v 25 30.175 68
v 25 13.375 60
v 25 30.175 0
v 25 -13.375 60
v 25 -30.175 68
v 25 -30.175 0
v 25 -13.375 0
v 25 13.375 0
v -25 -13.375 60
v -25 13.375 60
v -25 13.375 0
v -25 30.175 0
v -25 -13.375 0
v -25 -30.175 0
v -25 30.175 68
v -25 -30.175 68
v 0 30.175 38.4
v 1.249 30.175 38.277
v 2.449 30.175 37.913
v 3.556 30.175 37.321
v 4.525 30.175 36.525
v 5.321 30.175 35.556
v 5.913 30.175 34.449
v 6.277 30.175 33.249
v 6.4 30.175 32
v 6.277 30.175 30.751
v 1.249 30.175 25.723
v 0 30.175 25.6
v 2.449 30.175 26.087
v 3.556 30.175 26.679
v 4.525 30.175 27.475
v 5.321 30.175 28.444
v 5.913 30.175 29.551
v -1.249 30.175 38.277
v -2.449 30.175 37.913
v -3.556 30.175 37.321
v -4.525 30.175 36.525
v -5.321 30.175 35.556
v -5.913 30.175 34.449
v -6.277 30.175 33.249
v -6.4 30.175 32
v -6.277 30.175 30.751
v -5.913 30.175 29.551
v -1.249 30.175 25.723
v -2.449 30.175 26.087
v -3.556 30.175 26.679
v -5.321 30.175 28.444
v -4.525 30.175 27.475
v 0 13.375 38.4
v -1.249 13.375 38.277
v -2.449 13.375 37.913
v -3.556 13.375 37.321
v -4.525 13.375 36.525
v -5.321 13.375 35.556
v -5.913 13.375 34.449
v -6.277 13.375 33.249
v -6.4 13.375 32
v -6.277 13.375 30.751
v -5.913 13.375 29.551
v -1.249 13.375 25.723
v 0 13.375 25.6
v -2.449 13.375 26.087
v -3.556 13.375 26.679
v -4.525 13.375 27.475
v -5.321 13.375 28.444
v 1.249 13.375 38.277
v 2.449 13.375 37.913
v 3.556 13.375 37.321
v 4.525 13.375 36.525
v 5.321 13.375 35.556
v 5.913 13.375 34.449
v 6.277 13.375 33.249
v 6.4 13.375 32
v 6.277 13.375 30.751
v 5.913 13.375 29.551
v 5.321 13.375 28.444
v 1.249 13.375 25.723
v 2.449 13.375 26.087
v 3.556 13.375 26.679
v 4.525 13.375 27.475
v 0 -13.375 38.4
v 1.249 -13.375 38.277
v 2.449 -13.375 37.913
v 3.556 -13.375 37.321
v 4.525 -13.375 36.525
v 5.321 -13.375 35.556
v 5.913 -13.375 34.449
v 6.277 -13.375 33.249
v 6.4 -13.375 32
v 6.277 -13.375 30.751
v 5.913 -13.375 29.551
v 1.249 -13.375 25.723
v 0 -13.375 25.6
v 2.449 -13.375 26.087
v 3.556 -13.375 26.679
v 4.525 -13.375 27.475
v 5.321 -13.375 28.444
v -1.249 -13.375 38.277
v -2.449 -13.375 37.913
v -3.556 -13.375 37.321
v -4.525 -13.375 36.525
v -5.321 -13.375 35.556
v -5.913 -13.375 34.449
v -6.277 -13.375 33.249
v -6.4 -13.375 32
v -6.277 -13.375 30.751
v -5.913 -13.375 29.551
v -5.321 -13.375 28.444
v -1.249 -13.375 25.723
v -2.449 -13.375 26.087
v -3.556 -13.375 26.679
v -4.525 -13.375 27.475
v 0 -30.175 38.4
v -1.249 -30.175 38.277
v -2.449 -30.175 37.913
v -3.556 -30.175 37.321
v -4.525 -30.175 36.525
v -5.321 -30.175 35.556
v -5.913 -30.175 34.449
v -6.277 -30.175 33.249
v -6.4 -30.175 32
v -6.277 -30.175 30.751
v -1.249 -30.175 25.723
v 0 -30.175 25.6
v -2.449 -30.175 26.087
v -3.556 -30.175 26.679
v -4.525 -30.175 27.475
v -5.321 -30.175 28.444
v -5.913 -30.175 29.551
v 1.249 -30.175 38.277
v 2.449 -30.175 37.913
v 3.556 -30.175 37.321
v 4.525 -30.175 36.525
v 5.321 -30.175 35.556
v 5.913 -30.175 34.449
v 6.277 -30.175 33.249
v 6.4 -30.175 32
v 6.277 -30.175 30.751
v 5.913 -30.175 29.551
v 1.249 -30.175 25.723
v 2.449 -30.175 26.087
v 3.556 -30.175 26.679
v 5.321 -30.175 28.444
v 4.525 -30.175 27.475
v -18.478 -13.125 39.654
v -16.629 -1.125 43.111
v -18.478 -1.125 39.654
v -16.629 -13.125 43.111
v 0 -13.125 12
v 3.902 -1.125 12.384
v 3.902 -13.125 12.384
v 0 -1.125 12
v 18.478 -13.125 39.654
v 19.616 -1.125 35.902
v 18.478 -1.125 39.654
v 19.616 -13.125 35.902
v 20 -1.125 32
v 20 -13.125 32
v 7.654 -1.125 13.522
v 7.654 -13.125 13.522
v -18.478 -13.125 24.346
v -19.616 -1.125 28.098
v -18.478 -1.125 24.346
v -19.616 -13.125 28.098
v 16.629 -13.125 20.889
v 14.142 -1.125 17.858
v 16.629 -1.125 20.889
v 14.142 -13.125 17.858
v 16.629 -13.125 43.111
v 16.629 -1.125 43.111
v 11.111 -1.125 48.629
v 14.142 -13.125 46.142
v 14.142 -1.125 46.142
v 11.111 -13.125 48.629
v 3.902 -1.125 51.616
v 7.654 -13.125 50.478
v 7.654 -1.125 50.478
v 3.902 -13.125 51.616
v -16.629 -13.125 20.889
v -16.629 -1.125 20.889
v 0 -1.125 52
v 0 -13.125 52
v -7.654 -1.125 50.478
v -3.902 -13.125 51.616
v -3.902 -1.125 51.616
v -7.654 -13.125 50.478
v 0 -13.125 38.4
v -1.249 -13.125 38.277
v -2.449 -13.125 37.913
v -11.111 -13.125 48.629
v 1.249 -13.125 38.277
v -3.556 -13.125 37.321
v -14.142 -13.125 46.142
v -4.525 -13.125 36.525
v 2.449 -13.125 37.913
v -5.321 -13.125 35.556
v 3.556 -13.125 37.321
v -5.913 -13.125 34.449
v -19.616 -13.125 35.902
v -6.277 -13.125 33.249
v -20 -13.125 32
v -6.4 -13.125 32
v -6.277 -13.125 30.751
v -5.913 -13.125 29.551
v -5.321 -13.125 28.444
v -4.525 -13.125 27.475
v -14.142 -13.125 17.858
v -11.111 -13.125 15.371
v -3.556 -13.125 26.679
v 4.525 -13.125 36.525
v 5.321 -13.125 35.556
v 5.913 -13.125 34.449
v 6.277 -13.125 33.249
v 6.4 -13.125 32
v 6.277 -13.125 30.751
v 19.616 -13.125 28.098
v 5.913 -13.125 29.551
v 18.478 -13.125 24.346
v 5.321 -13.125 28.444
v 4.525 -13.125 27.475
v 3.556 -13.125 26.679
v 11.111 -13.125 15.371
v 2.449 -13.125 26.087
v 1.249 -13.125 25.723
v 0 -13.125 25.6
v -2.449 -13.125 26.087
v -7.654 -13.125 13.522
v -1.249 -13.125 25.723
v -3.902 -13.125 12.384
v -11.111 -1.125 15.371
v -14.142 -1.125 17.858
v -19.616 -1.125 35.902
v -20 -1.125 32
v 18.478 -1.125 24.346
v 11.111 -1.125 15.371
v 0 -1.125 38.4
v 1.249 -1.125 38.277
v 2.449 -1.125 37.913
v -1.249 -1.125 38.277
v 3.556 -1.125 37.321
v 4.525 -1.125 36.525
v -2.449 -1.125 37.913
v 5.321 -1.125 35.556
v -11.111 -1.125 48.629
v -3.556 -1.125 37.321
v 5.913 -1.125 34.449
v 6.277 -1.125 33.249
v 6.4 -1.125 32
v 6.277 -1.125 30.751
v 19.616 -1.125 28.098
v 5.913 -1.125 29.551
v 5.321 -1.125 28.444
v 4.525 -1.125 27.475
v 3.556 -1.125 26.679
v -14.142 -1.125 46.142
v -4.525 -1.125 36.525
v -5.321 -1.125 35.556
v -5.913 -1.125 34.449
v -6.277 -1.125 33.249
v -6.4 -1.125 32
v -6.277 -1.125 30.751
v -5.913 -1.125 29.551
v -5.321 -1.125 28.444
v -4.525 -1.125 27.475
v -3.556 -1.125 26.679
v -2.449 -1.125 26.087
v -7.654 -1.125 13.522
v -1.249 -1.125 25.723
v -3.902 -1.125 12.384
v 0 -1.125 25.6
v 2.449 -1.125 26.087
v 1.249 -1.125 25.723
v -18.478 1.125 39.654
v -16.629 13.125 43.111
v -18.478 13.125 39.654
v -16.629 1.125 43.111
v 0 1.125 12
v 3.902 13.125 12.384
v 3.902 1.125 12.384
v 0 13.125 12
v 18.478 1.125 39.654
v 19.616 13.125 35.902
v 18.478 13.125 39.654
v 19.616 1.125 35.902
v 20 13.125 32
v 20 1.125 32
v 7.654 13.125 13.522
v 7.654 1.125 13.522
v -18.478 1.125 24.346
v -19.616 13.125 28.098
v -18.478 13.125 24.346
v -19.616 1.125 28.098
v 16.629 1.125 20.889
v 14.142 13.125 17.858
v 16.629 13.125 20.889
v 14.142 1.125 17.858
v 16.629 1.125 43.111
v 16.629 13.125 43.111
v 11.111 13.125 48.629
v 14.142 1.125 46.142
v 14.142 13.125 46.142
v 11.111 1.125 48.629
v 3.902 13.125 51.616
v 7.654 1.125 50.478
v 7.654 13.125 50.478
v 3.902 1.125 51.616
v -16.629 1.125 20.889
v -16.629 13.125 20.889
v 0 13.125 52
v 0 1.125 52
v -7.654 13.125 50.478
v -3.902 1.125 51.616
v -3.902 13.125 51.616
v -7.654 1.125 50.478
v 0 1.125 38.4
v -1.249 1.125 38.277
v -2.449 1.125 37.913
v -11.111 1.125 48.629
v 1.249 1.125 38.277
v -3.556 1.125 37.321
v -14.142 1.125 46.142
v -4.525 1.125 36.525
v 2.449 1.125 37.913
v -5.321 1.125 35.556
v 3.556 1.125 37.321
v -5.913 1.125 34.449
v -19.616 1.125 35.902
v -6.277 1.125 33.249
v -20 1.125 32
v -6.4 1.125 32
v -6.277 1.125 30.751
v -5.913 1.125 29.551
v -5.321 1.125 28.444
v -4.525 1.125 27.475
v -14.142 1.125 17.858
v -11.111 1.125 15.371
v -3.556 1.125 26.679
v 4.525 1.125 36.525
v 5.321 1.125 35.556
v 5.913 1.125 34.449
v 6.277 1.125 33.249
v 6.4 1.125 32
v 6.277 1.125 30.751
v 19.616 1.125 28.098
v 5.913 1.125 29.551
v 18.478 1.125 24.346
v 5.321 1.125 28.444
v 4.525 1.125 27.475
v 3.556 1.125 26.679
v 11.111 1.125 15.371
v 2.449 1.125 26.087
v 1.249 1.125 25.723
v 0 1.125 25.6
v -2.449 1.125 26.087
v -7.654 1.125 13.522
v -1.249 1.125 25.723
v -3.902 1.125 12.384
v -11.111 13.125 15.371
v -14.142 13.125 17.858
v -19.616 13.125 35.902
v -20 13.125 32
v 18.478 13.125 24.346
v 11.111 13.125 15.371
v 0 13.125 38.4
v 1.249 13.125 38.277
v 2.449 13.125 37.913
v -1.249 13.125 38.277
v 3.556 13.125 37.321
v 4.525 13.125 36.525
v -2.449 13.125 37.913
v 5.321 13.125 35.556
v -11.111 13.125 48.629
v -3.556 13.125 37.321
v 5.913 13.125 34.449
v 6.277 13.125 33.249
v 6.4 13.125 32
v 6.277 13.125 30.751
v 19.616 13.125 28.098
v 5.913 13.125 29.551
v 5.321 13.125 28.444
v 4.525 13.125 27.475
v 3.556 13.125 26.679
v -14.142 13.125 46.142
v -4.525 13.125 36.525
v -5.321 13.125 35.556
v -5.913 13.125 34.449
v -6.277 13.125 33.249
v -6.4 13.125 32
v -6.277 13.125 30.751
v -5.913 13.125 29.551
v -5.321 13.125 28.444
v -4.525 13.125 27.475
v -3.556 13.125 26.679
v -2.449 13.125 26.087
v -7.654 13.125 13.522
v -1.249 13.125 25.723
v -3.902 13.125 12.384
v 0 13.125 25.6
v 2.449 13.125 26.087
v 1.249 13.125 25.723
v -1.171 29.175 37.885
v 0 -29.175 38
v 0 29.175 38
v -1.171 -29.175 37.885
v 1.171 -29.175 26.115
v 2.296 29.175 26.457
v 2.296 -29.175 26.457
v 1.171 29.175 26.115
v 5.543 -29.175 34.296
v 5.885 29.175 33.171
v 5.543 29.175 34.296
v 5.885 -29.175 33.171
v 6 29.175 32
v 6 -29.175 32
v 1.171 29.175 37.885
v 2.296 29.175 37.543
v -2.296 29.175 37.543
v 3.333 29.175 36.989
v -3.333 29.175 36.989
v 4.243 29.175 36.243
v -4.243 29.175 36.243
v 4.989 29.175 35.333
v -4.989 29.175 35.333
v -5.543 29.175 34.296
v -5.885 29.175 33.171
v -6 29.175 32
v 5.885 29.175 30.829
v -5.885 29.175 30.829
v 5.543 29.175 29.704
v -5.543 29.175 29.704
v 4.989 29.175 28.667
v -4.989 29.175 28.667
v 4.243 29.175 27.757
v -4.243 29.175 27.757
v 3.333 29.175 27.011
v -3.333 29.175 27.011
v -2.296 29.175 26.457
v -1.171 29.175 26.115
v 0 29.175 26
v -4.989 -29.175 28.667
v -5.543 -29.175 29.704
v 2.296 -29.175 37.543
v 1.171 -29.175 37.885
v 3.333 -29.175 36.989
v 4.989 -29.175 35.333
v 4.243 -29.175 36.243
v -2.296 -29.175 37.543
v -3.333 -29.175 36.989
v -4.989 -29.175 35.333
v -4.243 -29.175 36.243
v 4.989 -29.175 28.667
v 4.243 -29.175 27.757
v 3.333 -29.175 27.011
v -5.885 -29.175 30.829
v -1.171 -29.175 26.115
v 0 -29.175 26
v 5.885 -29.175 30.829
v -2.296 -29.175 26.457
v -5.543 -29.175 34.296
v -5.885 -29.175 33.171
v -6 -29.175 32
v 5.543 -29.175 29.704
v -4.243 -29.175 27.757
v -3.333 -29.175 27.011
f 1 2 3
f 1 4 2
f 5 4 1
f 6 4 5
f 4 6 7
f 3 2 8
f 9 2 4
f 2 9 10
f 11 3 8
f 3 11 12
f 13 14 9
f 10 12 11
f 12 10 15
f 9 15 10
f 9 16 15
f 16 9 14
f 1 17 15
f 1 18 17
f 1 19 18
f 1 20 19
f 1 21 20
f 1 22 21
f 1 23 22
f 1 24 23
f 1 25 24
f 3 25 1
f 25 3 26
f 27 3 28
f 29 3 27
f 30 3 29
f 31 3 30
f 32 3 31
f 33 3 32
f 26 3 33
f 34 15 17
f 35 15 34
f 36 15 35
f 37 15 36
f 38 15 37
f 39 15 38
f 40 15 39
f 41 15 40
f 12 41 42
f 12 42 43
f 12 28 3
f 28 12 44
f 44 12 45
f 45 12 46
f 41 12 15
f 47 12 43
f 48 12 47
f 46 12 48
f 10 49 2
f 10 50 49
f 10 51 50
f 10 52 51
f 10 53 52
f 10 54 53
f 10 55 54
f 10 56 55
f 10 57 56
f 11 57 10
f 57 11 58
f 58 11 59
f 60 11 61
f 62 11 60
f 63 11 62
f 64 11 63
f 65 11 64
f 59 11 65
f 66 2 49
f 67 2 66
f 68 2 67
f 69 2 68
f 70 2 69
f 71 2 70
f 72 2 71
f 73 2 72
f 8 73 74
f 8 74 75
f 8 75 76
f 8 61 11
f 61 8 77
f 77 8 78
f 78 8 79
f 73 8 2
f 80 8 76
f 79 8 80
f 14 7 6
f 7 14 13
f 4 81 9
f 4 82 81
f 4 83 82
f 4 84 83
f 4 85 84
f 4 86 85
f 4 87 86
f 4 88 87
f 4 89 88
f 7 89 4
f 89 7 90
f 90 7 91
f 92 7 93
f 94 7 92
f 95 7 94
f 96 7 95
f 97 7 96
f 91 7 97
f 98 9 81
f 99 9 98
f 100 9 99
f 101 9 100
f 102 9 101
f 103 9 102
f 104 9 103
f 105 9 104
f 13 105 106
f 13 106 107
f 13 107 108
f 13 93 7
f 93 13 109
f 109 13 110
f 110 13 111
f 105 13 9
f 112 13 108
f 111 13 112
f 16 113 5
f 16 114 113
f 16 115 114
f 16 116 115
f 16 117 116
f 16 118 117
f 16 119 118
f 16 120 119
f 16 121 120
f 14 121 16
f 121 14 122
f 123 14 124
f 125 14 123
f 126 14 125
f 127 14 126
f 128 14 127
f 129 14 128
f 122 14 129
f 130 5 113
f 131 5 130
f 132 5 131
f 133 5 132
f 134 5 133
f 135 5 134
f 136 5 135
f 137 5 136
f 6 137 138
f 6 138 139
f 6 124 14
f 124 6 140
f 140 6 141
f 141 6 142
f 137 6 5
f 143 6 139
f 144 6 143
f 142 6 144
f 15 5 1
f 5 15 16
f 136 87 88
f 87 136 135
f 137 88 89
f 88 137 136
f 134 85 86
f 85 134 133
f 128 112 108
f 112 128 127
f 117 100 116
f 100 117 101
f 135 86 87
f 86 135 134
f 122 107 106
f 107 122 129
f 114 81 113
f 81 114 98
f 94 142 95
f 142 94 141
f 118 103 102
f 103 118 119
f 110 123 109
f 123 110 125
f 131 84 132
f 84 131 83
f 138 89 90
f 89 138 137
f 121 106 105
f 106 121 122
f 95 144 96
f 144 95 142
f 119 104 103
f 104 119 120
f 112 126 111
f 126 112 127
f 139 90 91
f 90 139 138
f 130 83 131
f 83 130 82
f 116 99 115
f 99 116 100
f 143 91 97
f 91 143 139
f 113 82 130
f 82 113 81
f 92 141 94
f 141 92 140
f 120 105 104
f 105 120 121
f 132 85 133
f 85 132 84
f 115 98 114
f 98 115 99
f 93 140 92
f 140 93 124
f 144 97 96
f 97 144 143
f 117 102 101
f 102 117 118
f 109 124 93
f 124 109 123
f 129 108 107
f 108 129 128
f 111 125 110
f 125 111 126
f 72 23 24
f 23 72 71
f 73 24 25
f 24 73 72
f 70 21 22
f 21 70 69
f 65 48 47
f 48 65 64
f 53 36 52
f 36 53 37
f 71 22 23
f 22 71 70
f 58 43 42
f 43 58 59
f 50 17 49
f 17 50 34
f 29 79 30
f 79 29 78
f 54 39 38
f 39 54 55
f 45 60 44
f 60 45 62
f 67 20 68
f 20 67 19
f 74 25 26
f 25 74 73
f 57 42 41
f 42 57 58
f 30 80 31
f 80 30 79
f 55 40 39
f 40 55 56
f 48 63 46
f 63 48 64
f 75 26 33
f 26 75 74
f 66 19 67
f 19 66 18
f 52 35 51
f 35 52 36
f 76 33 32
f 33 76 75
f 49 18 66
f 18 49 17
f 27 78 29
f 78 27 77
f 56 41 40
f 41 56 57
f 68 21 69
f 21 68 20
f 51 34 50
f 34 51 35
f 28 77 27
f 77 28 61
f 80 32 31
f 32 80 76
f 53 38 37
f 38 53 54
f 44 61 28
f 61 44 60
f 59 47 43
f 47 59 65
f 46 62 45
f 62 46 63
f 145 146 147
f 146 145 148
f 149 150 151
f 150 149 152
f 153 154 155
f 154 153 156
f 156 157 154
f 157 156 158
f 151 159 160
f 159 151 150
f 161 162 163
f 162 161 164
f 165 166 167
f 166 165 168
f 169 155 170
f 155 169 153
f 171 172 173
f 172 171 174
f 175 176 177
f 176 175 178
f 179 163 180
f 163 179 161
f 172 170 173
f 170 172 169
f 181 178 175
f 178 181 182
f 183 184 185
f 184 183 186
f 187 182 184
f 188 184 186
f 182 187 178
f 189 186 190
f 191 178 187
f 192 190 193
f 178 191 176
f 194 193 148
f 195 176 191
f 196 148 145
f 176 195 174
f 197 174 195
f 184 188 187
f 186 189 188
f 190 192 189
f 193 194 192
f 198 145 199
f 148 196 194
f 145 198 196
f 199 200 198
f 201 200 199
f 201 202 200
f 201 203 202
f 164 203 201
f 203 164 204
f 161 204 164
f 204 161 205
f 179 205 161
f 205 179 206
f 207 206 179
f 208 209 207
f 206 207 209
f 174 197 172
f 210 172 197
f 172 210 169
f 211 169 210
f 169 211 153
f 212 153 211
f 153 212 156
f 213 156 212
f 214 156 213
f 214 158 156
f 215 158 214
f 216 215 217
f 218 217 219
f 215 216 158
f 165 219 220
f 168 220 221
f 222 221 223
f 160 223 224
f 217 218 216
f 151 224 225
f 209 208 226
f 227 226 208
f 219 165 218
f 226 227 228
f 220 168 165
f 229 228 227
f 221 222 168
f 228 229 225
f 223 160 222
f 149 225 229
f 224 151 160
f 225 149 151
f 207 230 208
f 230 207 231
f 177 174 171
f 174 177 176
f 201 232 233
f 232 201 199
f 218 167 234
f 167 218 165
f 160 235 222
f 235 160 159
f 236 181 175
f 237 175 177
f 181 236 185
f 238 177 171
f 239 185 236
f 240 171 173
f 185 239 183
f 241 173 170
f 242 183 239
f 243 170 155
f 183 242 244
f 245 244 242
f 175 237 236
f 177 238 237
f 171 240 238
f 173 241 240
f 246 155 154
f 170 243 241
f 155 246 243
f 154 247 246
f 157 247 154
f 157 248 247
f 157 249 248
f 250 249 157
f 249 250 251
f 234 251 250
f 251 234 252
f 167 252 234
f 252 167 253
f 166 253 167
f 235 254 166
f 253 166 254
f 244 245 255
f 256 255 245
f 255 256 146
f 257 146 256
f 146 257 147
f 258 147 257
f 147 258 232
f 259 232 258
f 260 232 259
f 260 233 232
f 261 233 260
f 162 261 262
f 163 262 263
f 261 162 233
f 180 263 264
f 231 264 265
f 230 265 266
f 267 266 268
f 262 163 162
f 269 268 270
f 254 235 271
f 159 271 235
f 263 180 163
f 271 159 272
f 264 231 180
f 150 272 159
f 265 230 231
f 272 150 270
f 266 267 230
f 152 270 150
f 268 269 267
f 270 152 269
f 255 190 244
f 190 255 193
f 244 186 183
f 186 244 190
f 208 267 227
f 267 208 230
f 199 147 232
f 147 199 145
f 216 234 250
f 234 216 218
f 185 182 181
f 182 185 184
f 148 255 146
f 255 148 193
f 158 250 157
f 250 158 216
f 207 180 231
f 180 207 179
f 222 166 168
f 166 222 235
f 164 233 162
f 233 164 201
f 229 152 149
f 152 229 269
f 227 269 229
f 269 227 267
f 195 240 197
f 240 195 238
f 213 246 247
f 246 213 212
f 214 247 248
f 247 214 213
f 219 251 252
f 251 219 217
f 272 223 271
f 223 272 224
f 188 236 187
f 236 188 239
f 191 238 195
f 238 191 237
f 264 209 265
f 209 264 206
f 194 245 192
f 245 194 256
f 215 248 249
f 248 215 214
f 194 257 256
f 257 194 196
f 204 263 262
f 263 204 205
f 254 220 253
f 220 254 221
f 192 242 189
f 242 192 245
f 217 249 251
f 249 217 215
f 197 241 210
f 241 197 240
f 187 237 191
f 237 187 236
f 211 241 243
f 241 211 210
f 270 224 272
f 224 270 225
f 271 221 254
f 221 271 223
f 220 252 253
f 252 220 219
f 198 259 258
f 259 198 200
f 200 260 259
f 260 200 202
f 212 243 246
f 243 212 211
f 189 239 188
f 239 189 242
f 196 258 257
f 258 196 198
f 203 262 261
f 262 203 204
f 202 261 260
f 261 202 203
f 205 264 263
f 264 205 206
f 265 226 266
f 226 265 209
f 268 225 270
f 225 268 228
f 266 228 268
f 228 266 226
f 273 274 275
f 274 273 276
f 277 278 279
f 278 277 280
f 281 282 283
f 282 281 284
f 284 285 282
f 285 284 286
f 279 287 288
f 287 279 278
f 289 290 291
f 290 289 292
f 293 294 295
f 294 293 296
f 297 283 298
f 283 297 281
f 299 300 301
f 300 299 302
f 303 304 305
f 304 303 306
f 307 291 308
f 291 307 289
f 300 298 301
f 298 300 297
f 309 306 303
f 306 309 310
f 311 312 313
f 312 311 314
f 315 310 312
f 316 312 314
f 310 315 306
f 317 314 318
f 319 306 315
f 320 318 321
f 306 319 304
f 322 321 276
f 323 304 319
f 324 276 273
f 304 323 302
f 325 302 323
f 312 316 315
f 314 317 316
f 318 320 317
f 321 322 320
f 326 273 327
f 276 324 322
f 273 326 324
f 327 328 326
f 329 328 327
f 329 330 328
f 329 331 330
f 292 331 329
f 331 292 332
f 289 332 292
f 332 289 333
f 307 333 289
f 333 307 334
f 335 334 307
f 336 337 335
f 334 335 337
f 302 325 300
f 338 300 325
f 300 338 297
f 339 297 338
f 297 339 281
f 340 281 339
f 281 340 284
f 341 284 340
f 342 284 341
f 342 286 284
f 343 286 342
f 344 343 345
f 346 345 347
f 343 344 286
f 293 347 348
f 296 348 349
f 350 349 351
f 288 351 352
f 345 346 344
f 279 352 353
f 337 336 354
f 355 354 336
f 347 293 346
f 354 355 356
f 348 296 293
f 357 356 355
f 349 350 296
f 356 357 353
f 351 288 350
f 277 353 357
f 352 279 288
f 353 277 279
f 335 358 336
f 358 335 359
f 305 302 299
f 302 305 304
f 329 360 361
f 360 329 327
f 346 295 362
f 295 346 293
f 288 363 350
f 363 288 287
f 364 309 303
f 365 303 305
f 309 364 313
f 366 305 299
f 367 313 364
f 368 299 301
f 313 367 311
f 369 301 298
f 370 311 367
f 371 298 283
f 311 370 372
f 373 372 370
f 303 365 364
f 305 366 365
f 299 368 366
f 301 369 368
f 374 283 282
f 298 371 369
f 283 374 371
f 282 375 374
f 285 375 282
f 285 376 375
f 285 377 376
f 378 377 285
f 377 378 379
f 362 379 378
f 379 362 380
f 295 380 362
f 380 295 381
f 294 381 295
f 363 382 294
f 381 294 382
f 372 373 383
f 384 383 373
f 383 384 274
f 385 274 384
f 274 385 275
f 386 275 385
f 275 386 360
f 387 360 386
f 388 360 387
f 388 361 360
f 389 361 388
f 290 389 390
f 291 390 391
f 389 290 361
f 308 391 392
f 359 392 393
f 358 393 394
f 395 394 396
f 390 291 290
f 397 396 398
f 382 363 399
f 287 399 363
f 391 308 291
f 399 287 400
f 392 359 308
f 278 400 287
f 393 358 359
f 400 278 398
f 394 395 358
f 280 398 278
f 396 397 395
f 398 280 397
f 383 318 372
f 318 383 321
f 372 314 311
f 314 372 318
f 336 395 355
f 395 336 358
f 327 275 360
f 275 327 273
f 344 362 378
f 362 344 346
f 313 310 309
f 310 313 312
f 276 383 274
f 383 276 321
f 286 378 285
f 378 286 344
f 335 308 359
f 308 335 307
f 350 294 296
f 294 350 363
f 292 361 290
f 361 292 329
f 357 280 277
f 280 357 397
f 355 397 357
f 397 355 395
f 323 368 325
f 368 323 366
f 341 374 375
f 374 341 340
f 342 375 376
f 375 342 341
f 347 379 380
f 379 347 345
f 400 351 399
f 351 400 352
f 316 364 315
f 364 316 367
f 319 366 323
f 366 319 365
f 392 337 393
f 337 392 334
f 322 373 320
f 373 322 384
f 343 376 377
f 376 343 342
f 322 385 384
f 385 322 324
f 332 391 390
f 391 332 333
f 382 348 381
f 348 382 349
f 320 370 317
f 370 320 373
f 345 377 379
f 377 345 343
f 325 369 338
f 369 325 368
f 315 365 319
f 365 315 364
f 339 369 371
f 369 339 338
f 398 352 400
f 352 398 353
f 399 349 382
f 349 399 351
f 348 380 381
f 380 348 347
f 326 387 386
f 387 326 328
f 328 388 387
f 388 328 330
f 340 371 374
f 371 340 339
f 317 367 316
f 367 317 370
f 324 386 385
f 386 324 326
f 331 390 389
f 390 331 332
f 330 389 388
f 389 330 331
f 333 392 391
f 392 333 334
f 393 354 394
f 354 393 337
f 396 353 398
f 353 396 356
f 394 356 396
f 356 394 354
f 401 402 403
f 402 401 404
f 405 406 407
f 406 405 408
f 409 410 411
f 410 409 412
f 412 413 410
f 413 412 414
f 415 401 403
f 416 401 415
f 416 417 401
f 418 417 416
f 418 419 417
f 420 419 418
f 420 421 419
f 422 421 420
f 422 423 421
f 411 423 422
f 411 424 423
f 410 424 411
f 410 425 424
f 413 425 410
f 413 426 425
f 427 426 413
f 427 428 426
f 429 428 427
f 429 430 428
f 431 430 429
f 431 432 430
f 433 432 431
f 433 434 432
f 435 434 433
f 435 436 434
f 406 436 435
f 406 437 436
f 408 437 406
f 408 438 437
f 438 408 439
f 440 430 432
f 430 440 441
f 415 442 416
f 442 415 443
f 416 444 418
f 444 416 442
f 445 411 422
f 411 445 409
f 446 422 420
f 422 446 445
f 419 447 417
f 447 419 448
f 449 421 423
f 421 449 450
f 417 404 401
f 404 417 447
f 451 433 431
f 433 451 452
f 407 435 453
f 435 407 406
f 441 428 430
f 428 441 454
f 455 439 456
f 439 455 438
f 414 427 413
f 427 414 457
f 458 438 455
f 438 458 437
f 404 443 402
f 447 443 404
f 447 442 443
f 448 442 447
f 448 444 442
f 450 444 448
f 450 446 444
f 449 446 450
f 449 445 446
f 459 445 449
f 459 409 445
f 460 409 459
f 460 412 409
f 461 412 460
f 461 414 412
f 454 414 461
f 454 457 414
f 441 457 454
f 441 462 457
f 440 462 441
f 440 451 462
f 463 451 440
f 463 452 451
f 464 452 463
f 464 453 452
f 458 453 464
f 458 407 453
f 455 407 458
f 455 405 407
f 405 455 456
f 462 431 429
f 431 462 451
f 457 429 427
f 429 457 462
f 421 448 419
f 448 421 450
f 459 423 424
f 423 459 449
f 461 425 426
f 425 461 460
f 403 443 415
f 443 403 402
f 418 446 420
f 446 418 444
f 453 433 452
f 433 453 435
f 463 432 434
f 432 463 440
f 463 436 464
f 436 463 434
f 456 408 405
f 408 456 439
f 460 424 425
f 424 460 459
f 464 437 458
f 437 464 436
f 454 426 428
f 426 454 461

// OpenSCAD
$fn = 32;

// ------------------------------------------------------------------------
// Trolley wheel set: wheels d40, fork 60 mm tall
// Every part is its own module, assembly() places every instance.
// ------------------------------------------------------------------------

// --- part 1 ---
module trolley_fork() {
  difference() {
    union() {
      translate([-25, 13.375, 0]) cube([50, 16.8, 60]);
      translate([-25, -30.175, 0]) cube([50, 16.8, 60]);
      translate([-25, -30.175, 60]) cube([50, 60.35, 8]);
    }
    translate([0, -21.775, 32]) rotate([90, 0, 0]) cylinder(h = 18.8, d = 12.8, center = true);
    translate([0, 21.775, 32]) rotate([90, 0, 0]) cylinder(h = 18.8, d = 12.8, center = true);
  }
}

// --- part 2 ---
module trolley_wheel() {
  difference() {
      translate([0, 0, 0]) cylinder(h = 12, d = 40);
      translate([0, 0, -1]) cylinder(h = 14, d = 12.8);
    }
}

// --- part 3 ---
module trolley_axle() {
  translate([0, 0, -29.175]) cylinder(h = 58.35, d = 12);
}

// --- assembly ---
module assembly() {
  color([0.80, 0.24, 0.20]) translate([0, 0, 0]) rotate([0, 0, 0]) trolley_fork();
  color([0.20, 0.45, 0.75]) translate([0, -1.125, 32]) rotate([90, 0, 0]) trolley_wheel();
  color([0.25, 0.62, 0.32]) translate([0, 13.125, 32]) rotate([90, 0, 0]) trolley_wheel();
  color([0.92, 0.70, 0.18]) translate([0, 0, 32]) rotate([90, 0, 0]) trolley_axle();
}

assembly();
